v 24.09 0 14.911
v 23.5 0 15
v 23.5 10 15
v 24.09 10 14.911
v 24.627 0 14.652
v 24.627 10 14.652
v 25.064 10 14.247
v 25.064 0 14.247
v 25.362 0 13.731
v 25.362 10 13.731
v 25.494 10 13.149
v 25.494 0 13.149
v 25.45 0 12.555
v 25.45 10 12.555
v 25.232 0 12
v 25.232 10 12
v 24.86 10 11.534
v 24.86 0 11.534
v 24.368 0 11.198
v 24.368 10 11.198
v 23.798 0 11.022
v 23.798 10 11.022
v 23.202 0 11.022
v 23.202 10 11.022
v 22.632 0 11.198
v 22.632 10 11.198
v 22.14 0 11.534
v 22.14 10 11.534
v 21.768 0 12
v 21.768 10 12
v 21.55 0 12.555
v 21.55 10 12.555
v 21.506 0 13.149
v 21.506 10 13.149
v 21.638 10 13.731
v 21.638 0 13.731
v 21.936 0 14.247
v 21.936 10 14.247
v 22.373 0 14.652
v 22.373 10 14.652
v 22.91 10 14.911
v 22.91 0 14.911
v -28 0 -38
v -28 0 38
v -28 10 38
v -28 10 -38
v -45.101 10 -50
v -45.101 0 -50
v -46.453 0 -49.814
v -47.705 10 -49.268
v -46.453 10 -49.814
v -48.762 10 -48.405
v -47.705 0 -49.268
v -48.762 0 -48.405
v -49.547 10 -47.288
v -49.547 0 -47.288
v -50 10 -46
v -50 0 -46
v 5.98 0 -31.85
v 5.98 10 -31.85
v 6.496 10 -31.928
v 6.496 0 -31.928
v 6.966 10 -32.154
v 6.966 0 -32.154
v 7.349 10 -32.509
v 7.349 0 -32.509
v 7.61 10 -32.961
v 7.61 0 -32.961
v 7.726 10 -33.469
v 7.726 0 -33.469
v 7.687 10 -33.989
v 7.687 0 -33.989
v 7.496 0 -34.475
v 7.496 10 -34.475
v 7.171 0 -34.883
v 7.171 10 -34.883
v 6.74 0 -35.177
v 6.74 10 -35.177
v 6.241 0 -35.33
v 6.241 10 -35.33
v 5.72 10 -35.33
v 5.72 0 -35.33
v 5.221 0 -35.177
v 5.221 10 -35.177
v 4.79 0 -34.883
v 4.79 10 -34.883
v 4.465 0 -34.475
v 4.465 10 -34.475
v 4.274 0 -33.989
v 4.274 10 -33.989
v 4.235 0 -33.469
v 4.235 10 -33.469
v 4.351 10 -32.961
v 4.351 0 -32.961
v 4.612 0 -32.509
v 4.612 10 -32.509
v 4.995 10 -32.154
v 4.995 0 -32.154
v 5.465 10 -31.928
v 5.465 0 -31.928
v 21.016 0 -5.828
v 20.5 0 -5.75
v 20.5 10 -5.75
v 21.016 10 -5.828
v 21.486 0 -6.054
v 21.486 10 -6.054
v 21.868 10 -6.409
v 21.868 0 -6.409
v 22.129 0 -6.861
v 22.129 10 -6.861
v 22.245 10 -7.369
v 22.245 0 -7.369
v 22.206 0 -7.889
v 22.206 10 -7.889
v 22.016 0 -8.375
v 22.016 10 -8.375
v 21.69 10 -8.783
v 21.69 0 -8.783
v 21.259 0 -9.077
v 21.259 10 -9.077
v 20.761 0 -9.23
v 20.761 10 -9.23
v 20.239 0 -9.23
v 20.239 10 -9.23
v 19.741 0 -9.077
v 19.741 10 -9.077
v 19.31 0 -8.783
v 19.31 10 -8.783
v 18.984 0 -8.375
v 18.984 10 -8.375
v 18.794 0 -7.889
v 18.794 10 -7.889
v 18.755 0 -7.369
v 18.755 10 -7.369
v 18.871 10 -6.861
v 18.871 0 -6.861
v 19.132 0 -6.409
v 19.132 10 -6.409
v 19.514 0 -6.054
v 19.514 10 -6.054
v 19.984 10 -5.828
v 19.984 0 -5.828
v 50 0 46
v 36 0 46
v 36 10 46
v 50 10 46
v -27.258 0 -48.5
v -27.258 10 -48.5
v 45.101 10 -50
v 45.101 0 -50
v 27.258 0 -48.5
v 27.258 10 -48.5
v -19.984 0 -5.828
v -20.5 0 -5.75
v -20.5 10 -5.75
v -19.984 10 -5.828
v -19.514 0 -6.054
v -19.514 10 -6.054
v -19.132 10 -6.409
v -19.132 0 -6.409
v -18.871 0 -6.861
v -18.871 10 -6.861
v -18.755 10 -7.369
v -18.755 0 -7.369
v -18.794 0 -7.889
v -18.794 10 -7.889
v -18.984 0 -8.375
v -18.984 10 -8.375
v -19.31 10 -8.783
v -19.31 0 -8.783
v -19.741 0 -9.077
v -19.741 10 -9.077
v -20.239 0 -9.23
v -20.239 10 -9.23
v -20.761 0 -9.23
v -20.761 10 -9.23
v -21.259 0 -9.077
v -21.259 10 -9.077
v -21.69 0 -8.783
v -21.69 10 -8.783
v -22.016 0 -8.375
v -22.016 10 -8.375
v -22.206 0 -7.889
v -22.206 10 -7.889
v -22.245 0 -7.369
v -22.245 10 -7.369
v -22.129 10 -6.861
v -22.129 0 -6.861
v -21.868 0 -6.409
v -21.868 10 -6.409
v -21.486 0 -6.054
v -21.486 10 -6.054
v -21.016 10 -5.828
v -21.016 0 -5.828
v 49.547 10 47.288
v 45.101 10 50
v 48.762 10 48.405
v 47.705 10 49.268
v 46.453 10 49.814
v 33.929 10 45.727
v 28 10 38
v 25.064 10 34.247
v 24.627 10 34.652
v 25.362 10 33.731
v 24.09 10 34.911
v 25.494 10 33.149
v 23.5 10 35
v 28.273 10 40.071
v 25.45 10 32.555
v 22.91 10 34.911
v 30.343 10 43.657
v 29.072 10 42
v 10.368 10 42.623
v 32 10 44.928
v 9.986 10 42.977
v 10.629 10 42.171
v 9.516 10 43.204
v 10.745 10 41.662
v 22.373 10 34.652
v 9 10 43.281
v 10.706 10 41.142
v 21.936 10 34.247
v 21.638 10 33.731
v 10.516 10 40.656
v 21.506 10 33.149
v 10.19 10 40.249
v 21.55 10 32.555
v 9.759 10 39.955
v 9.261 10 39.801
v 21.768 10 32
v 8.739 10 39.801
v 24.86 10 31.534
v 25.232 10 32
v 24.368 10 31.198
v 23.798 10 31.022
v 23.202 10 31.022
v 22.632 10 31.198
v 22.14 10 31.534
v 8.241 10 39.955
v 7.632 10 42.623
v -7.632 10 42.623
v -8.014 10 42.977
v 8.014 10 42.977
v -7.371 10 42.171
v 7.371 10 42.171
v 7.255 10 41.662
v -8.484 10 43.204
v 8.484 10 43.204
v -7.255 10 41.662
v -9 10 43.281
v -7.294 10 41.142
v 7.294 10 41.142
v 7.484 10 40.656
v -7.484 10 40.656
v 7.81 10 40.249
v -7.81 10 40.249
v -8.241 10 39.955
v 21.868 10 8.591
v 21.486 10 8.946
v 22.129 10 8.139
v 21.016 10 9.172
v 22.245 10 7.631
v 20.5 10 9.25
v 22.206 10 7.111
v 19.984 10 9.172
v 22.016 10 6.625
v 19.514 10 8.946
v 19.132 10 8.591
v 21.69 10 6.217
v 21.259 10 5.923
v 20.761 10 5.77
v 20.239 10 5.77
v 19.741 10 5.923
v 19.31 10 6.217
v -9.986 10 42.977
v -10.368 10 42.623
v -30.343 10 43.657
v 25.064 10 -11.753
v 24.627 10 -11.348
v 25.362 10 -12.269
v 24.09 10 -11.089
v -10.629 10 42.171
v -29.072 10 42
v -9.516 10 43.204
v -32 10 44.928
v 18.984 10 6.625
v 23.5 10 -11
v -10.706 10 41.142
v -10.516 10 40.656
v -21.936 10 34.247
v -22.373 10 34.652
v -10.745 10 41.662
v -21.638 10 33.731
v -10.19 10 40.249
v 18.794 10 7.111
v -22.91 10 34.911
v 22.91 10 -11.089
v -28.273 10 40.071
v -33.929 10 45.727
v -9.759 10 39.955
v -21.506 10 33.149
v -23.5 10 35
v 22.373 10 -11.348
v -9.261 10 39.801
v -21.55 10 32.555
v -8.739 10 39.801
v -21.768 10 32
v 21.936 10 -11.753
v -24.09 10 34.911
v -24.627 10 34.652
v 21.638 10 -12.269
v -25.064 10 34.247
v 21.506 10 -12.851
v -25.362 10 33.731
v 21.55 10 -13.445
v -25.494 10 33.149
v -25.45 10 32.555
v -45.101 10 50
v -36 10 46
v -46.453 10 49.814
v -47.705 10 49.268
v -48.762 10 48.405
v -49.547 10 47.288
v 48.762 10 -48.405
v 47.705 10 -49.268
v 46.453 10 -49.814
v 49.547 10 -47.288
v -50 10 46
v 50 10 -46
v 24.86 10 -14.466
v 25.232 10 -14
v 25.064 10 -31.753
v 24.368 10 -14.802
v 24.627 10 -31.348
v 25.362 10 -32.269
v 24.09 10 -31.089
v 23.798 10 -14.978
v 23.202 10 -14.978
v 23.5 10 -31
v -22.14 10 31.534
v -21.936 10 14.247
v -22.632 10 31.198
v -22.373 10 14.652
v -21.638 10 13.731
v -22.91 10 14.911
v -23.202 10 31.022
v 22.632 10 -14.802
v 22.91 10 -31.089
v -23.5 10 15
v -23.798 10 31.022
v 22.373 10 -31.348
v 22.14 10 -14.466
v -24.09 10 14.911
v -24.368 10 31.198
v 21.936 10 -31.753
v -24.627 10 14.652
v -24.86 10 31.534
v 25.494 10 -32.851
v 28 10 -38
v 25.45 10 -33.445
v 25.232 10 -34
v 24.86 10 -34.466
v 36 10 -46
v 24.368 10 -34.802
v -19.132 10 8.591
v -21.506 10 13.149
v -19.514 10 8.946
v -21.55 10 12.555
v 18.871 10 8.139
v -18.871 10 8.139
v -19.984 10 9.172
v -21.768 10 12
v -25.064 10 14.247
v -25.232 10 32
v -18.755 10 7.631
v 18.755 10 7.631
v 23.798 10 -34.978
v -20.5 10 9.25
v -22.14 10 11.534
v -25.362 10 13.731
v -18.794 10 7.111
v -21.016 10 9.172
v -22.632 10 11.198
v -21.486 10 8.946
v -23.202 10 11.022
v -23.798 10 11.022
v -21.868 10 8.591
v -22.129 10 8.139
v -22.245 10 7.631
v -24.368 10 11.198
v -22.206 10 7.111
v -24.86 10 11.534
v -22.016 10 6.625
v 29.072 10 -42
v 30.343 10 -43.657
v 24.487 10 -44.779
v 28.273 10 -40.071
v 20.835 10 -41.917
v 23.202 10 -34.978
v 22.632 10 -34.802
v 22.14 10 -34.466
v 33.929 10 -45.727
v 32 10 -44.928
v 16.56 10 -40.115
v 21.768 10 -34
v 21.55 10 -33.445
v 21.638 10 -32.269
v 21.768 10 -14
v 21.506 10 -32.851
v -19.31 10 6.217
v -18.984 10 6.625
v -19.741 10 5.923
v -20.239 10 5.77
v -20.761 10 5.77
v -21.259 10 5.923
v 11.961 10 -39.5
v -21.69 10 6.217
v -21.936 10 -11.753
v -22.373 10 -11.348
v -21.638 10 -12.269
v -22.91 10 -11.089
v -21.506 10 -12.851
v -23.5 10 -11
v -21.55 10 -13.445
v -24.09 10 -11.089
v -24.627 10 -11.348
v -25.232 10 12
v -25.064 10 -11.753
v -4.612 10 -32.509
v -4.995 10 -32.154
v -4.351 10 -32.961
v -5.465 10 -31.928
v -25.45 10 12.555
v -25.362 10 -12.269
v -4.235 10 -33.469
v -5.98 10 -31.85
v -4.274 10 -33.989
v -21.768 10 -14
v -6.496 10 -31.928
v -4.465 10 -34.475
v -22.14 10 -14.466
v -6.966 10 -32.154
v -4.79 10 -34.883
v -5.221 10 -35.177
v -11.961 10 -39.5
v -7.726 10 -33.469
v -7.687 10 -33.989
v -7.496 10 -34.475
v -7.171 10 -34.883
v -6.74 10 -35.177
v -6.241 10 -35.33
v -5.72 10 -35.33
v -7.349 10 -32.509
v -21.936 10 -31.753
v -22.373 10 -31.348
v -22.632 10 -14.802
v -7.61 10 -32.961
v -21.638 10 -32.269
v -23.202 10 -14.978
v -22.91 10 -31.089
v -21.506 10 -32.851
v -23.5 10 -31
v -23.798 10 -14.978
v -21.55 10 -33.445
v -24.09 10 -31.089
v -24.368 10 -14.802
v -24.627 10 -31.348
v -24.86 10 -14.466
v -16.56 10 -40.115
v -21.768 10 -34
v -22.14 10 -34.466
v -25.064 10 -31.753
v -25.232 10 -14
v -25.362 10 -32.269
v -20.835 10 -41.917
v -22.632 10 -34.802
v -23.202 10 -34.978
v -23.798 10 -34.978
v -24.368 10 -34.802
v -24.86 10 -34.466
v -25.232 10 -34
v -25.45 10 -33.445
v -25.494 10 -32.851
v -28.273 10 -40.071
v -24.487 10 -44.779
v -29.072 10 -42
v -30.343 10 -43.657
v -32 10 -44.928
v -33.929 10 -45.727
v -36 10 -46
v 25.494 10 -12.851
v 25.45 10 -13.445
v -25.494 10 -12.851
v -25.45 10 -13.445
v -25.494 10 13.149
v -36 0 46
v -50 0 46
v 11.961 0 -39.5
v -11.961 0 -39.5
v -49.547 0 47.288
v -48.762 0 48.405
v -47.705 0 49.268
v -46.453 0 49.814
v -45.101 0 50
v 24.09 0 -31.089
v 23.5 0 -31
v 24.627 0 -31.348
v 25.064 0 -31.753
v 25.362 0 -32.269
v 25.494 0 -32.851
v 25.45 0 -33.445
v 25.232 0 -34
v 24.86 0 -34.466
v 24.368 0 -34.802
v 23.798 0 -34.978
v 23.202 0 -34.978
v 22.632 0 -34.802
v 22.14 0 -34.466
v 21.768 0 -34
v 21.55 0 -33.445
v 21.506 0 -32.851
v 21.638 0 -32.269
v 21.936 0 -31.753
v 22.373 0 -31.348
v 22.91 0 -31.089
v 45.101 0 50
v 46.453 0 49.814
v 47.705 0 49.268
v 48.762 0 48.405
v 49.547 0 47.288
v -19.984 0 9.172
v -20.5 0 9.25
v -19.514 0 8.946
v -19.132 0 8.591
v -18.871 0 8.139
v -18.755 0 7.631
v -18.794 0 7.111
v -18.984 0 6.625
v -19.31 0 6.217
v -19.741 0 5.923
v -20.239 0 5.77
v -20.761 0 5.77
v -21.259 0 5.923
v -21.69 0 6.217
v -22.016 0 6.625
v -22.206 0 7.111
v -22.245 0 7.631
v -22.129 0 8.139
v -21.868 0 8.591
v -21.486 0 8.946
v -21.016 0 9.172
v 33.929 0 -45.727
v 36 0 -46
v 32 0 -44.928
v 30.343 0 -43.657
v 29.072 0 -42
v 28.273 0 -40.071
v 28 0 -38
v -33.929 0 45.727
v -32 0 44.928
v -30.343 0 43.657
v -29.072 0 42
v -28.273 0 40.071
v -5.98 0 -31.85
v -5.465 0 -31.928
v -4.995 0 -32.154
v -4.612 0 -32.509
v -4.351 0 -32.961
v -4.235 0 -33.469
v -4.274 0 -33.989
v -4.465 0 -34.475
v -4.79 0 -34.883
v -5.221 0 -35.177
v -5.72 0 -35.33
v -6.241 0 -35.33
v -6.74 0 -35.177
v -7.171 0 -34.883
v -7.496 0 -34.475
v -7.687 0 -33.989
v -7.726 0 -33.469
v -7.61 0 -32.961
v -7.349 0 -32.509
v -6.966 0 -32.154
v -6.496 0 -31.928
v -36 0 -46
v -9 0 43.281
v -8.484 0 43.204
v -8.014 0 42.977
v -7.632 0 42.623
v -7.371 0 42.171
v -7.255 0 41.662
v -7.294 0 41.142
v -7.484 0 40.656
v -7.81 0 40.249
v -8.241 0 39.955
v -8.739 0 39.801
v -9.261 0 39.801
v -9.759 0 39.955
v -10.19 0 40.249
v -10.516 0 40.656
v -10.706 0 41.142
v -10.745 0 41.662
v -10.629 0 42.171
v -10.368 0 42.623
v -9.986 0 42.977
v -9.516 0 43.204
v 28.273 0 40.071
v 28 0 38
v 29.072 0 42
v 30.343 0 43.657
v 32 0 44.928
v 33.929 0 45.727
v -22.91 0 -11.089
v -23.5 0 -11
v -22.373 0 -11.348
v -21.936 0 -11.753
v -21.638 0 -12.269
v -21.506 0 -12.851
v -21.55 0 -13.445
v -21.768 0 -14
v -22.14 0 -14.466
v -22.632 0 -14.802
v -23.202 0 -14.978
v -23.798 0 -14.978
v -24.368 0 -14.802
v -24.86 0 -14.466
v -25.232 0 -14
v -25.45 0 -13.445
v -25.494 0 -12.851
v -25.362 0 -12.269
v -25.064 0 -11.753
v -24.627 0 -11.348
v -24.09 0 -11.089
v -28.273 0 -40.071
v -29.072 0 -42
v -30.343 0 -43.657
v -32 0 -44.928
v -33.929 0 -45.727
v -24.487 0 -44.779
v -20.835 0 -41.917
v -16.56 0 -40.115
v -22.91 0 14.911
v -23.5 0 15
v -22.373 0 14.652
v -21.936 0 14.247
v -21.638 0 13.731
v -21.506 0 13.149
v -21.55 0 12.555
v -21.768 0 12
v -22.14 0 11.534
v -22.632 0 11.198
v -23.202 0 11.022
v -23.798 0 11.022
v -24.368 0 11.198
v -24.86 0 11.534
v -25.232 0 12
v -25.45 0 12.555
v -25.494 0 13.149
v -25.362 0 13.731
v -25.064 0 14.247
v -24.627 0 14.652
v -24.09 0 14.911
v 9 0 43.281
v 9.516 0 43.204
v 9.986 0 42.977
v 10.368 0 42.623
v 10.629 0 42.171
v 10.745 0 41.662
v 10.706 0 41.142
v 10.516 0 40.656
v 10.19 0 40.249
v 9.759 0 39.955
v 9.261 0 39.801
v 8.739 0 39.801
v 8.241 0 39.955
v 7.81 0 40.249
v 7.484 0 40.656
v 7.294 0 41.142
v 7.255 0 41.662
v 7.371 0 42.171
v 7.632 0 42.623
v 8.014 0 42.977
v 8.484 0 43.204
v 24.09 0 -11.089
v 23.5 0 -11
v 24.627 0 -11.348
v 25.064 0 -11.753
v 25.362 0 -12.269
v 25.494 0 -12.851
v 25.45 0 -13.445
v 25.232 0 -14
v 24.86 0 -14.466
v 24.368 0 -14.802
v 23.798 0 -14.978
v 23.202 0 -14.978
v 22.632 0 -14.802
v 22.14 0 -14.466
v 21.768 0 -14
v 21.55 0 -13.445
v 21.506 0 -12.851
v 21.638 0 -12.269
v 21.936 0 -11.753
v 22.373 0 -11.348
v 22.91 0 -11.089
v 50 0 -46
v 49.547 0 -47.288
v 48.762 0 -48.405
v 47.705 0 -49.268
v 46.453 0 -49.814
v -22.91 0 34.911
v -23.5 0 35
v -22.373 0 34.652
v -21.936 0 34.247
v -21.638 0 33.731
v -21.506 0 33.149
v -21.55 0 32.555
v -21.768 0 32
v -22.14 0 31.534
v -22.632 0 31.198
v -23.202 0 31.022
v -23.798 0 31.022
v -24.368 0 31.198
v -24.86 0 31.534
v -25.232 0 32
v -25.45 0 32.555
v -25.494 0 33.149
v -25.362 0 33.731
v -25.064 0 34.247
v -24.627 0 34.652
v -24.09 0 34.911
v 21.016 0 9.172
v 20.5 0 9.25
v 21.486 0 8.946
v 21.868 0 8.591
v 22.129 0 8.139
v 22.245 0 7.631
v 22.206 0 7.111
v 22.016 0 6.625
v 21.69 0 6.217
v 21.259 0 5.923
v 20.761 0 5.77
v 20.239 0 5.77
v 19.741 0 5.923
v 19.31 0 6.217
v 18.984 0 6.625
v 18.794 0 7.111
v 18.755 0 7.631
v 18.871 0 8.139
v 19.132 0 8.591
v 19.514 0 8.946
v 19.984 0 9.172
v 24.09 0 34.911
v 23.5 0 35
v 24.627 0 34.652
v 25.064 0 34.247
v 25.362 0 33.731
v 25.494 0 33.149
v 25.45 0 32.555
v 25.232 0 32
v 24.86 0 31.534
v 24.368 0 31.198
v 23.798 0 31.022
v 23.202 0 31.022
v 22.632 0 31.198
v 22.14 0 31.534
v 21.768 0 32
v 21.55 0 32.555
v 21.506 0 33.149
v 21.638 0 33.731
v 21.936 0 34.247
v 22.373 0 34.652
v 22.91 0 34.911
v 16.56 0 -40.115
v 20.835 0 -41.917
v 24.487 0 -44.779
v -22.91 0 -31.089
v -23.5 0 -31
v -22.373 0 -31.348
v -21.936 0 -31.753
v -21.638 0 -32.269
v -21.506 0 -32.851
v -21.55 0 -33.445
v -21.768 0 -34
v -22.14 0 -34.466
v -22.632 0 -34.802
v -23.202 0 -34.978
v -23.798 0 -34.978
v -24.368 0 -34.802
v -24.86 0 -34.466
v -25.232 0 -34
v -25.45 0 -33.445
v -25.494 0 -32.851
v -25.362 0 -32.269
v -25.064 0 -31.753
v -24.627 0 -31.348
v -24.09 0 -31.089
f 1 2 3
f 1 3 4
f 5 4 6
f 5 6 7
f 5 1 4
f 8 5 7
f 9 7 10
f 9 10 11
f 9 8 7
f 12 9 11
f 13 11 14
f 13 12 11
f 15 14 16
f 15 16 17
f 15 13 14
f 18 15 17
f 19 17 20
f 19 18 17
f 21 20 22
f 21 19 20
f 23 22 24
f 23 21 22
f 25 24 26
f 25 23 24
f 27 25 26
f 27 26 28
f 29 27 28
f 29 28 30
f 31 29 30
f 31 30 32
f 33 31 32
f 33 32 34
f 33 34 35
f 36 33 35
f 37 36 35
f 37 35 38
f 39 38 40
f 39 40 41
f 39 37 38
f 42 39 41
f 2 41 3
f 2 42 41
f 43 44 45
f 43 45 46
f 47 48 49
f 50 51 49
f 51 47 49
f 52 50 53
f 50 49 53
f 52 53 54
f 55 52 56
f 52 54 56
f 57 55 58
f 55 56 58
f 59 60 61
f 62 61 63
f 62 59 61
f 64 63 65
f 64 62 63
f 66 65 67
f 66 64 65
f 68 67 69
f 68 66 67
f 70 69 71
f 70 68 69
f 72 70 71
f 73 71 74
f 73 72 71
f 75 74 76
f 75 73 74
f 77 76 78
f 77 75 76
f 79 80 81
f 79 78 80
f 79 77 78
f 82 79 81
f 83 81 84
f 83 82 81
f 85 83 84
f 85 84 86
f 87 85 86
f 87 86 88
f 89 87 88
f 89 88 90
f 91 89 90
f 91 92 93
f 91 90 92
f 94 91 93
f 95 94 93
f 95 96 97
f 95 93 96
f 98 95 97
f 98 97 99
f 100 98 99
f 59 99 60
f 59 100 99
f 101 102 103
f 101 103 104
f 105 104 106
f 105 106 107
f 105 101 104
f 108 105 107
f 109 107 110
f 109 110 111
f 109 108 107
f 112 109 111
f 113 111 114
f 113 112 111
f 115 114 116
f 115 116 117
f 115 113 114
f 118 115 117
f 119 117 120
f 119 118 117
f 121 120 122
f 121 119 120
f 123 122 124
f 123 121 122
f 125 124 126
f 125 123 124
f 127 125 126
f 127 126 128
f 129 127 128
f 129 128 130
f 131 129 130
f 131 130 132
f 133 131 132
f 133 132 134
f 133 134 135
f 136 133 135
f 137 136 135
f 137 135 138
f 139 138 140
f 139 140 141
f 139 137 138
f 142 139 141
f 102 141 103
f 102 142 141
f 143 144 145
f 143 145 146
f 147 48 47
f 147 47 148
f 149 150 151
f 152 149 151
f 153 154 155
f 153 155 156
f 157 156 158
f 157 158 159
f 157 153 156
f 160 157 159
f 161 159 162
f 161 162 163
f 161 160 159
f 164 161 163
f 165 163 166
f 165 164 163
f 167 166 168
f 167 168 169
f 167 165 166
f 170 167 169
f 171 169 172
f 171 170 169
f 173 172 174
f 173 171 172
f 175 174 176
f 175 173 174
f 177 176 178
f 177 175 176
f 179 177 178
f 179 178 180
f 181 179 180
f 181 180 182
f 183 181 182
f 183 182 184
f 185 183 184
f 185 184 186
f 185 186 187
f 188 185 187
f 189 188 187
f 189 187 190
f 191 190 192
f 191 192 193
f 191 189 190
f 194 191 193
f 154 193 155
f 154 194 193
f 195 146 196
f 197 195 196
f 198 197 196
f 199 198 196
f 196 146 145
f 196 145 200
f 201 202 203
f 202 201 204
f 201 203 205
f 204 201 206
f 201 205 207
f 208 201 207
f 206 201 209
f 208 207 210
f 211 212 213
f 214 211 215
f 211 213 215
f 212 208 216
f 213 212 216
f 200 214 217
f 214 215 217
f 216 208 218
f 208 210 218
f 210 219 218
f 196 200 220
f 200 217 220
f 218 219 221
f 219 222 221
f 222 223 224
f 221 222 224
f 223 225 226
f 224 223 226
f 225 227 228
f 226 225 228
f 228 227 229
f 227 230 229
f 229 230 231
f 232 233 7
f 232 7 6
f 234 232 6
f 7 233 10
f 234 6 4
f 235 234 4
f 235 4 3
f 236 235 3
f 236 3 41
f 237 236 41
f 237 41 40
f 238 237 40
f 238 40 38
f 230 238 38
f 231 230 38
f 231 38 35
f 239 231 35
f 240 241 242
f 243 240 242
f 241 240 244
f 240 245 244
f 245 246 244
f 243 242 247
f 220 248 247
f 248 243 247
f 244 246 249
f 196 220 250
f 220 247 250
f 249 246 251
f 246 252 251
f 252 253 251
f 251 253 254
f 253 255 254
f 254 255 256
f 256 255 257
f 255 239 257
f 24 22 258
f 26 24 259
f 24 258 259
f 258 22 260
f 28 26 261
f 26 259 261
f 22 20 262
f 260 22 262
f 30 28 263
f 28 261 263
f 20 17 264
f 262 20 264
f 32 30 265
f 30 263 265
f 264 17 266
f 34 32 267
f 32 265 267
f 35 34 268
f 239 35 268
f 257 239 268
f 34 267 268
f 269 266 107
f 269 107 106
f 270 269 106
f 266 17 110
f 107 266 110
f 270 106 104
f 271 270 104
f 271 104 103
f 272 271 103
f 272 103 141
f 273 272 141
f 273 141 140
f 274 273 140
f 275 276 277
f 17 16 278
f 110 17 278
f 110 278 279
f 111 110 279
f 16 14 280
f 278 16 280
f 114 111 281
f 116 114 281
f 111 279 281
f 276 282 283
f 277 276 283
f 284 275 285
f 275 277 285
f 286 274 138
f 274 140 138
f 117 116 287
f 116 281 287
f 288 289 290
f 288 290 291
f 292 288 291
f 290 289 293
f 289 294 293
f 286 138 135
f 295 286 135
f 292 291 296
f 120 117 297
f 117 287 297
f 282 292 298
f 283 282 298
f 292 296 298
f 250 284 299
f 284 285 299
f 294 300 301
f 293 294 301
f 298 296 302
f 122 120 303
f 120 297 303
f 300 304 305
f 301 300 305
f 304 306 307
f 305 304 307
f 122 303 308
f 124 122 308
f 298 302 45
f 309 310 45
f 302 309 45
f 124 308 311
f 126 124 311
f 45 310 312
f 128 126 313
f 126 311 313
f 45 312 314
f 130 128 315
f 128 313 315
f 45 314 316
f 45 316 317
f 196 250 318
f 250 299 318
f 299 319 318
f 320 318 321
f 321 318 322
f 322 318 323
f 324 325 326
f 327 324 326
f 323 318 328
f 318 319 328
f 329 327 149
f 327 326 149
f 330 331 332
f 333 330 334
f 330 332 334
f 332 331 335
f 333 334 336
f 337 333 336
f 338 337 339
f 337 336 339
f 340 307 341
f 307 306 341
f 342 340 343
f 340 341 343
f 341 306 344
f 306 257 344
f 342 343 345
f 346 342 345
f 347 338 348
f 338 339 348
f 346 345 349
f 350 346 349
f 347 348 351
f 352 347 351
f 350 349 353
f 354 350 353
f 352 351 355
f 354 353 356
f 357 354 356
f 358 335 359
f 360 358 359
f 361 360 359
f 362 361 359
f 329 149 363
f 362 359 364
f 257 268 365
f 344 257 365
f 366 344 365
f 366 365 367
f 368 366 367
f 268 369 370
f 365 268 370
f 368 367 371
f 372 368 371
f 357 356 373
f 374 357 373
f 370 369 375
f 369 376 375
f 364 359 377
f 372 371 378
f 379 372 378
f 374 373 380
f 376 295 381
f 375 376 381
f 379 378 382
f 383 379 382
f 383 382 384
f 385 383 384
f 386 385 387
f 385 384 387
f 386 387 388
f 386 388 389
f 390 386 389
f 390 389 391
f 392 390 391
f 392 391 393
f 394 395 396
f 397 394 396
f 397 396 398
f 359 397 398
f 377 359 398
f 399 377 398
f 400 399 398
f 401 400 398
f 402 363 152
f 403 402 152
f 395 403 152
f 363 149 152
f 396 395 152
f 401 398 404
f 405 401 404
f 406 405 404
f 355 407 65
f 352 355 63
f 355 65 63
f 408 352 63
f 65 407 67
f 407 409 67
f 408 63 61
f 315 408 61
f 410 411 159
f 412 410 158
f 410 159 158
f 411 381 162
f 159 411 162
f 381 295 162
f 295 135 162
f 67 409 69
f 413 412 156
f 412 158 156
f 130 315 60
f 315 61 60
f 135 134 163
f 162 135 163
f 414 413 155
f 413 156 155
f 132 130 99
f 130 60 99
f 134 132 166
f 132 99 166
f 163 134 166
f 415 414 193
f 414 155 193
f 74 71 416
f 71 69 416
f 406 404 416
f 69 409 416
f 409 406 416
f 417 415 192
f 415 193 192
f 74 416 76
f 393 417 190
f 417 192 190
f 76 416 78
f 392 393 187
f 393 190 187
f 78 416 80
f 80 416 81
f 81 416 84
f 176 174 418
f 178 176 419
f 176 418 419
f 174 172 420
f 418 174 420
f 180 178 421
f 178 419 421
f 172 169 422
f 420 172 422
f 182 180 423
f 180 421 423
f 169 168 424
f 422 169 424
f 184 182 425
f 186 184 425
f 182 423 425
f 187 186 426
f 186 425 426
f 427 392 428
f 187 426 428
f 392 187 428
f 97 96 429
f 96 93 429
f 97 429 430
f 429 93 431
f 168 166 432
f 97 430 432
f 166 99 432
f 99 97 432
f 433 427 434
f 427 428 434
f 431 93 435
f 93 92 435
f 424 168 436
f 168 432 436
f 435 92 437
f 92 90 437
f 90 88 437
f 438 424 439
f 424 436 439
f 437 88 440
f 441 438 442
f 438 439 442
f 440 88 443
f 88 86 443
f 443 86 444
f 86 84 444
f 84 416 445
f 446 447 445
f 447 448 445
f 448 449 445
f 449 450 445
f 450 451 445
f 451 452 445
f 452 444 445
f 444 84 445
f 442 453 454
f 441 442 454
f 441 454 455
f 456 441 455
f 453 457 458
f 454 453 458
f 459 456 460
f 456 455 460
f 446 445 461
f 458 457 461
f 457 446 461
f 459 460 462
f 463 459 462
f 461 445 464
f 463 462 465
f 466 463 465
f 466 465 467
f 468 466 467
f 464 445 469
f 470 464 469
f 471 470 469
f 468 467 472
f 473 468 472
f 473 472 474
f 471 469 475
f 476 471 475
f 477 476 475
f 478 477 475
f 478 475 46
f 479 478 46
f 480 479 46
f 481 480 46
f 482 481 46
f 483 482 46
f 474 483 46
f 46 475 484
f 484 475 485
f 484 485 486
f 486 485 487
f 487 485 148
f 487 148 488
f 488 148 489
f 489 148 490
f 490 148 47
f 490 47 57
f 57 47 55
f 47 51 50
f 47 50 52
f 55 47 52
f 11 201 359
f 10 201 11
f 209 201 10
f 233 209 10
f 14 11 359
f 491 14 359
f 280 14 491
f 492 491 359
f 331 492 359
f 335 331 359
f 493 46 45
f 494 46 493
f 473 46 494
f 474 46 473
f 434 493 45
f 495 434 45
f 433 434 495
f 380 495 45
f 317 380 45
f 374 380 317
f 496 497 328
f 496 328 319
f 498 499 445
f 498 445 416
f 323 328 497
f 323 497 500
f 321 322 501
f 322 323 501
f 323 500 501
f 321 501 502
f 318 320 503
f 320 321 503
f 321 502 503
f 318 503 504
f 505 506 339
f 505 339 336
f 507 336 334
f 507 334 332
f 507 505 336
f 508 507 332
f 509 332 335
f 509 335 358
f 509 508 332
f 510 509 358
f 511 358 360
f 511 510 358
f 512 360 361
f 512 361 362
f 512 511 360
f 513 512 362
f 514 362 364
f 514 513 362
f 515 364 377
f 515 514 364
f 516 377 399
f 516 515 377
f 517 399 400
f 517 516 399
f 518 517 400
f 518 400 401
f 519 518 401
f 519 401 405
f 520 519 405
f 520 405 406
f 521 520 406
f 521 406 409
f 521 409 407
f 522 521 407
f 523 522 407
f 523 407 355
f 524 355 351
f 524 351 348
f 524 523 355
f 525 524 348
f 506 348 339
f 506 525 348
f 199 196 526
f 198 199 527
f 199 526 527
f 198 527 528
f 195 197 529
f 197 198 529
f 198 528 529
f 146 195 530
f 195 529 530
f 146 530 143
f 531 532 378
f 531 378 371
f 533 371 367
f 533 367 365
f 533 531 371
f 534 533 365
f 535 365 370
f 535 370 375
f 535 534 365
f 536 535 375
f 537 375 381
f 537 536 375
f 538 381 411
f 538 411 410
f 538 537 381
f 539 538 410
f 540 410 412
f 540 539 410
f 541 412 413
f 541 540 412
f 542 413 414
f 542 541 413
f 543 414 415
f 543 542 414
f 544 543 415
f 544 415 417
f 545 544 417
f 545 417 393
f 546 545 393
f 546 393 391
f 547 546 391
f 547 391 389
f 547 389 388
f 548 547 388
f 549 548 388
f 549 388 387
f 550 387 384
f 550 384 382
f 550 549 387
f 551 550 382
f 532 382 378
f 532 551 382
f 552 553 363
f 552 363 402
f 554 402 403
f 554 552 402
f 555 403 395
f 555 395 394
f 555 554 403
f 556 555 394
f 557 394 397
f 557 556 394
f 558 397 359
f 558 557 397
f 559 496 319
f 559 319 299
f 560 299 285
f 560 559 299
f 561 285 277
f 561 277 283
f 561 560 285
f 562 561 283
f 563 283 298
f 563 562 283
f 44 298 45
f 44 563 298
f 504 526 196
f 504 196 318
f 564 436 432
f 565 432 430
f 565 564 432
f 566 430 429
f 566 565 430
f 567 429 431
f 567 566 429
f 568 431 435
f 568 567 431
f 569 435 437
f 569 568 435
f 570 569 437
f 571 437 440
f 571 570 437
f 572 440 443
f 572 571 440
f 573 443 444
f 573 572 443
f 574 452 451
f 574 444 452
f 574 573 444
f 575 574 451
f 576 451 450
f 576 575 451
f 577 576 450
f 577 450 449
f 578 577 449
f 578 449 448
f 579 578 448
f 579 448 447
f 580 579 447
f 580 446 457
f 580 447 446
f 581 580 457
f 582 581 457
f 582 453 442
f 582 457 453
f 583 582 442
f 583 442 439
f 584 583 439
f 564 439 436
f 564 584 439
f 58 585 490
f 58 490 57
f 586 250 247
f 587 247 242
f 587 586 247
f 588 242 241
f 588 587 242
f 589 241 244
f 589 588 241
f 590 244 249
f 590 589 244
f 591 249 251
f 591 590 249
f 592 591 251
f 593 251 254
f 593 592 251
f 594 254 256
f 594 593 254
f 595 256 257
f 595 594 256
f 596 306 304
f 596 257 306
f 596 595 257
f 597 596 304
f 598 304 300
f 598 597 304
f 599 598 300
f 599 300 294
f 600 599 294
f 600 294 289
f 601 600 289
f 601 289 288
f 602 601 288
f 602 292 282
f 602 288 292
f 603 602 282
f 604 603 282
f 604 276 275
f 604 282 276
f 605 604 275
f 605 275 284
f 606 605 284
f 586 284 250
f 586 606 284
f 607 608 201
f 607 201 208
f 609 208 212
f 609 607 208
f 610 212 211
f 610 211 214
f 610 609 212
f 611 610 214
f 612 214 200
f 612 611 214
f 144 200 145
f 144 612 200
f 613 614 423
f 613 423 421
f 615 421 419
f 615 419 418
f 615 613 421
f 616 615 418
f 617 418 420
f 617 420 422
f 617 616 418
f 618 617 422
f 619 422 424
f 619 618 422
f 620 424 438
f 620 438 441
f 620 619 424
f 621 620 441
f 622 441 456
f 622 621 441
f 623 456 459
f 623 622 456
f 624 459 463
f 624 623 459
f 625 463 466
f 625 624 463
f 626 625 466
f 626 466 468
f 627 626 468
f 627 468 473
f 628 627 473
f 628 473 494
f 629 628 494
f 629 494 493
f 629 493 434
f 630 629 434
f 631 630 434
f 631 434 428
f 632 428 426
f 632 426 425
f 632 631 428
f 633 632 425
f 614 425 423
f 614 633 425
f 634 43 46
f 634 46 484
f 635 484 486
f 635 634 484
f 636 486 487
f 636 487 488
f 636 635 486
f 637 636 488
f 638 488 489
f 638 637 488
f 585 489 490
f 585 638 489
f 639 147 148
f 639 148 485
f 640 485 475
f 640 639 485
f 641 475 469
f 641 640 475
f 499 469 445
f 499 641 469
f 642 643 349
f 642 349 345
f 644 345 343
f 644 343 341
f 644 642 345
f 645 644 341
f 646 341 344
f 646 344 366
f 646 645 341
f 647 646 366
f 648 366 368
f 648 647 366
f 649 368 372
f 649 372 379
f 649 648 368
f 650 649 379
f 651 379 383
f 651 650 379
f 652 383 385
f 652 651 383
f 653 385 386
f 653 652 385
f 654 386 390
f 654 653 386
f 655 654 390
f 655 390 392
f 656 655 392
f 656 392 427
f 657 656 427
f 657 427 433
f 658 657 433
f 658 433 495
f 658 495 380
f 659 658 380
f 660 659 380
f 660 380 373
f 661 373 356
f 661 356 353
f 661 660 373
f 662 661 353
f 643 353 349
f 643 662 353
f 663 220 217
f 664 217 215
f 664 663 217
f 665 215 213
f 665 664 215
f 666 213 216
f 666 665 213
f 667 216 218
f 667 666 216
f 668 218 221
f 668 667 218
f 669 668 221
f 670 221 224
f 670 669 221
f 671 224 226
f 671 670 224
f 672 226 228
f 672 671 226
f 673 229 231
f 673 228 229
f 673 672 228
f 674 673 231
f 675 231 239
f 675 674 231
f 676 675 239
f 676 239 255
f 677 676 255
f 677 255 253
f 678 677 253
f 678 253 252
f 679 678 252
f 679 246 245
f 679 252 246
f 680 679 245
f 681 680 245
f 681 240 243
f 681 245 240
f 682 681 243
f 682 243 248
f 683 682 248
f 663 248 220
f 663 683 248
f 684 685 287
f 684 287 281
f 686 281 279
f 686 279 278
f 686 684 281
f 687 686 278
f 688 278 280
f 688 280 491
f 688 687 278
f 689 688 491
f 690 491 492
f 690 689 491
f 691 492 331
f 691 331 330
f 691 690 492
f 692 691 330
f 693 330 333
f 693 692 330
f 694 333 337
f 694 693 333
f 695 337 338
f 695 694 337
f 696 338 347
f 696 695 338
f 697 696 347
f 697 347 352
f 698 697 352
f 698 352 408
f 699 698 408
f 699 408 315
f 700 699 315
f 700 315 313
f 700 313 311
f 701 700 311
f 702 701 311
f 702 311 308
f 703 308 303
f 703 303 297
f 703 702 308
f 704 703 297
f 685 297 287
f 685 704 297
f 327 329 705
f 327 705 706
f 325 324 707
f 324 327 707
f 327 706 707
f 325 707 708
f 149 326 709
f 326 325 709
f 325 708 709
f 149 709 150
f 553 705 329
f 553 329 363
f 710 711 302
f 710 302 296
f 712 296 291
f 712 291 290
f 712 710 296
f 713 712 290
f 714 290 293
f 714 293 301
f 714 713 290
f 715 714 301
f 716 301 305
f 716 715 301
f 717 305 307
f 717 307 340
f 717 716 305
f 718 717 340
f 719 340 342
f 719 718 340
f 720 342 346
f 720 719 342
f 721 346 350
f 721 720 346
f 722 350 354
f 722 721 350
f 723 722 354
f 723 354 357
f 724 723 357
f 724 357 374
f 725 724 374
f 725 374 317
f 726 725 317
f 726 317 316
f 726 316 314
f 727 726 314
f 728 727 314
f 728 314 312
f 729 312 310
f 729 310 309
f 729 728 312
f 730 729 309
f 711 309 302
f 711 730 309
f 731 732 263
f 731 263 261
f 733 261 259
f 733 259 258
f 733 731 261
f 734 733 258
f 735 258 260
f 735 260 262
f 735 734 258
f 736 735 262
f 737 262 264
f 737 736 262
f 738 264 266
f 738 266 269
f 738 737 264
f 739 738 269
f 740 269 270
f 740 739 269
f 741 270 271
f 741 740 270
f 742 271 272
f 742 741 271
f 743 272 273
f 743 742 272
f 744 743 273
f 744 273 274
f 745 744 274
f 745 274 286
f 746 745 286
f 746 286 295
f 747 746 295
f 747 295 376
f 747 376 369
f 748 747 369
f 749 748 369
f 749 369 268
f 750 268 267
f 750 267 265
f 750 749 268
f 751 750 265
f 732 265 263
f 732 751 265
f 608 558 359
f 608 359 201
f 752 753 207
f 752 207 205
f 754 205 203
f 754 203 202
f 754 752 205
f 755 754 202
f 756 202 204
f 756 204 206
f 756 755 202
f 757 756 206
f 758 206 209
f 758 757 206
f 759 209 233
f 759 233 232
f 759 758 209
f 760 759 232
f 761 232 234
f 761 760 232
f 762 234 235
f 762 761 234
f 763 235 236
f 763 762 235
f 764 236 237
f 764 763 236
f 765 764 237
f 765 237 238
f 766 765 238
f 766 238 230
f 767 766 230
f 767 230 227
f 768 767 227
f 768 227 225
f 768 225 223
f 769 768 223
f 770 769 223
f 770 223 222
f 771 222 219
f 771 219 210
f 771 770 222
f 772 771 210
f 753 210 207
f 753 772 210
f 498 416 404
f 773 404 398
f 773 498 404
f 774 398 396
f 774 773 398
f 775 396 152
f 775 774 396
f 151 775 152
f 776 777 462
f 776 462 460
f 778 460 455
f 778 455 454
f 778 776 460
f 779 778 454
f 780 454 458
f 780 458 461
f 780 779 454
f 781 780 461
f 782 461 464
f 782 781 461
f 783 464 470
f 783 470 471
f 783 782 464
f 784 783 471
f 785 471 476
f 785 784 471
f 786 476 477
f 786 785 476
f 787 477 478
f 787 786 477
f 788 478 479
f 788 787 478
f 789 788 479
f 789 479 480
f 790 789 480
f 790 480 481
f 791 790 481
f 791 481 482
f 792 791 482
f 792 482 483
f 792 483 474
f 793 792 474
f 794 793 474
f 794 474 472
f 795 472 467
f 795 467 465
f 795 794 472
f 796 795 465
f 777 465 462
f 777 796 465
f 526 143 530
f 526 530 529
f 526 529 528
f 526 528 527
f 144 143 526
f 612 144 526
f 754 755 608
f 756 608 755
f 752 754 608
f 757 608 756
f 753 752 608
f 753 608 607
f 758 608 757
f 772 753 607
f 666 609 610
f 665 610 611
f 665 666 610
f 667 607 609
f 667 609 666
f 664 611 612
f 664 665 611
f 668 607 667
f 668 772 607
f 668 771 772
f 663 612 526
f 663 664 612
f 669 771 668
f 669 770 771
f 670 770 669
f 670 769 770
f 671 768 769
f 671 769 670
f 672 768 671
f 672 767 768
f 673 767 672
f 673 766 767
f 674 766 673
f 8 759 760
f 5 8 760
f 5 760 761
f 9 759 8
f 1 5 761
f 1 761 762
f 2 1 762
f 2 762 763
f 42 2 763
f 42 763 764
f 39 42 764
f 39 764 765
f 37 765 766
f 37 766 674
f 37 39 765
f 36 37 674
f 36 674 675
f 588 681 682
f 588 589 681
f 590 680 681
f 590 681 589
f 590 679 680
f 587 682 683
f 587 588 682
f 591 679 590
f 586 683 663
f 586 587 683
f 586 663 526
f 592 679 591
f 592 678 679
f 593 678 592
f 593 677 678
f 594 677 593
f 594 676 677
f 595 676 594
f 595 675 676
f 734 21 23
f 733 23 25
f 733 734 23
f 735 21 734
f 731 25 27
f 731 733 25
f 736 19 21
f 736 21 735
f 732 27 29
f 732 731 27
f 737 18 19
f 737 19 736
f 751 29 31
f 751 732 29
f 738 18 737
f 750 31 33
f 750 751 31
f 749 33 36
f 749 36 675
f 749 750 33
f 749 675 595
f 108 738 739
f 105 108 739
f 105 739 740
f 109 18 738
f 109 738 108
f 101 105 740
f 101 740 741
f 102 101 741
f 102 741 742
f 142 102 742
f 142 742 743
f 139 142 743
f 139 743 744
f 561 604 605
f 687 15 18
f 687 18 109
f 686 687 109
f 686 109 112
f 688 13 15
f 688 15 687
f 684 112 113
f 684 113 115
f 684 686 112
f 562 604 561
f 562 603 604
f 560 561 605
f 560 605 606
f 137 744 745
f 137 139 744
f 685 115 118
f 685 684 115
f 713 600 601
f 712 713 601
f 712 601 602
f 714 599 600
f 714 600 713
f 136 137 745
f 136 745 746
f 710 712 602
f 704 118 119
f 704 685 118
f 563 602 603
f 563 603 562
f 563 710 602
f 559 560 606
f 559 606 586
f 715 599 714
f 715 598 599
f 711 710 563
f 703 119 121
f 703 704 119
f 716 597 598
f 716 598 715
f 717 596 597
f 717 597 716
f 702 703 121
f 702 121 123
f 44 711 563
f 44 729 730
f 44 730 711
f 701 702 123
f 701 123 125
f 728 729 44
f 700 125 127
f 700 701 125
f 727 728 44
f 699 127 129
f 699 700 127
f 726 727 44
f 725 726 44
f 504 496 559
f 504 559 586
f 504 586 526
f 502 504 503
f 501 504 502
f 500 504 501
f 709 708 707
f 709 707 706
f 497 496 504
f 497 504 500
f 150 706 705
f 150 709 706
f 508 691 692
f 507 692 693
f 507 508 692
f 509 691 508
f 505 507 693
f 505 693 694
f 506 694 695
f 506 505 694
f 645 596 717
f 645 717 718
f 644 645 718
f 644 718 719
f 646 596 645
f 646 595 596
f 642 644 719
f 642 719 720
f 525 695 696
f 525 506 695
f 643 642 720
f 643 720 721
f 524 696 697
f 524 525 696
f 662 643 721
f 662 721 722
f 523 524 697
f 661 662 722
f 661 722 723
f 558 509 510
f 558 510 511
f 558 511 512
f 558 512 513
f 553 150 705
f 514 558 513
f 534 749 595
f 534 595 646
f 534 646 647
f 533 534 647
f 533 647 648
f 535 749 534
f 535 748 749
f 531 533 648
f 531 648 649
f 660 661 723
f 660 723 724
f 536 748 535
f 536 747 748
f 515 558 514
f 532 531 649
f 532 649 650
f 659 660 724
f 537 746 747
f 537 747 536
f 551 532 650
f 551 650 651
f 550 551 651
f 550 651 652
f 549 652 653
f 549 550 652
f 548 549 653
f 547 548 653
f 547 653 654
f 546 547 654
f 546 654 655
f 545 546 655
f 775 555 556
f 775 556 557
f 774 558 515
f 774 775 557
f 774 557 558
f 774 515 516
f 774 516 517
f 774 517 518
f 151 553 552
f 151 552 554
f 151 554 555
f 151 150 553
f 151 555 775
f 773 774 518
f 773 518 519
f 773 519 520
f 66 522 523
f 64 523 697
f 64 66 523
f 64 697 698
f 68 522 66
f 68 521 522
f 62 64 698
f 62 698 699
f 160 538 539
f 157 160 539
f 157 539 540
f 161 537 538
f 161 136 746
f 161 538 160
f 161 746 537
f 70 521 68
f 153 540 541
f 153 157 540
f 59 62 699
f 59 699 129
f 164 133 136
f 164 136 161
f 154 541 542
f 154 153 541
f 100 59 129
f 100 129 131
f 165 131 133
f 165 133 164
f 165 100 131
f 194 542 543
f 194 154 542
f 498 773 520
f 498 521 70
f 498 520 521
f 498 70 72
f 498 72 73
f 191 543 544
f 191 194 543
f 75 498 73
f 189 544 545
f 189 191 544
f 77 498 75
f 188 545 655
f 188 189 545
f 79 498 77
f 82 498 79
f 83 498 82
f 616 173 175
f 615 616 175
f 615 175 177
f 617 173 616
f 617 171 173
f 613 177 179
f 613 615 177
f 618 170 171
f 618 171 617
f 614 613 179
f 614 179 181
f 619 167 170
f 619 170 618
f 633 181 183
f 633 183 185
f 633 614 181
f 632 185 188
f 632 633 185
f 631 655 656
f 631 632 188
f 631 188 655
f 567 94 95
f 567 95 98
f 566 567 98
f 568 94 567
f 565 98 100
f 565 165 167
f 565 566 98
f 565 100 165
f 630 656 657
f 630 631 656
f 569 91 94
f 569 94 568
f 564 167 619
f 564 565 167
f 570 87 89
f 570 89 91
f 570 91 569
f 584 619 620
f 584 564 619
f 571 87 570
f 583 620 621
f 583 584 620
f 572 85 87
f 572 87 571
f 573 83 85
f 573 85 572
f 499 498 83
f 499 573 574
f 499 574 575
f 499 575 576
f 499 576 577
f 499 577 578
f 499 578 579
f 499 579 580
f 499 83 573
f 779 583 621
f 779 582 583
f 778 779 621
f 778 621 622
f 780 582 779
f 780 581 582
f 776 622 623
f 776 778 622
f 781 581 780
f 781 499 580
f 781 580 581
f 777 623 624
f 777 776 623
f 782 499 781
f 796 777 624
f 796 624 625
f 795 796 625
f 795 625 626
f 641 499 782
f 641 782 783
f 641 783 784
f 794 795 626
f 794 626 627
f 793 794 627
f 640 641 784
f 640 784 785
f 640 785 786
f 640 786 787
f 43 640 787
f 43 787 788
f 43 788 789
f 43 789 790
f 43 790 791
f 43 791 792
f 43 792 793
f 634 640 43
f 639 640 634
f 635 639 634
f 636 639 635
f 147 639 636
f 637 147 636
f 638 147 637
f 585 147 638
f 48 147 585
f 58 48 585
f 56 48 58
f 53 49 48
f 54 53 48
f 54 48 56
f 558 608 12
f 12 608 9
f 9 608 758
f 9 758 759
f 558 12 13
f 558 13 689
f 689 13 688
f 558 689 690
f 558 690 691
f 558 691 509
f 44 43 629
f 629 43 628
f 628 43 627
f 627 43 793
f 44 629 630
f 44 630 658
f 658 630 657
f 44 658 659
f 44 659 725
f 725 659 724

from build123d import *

# Parameters (mm, degrees)
SKETCH2_R               = 2
SKETCH2_R_2             = 1.75
BOSS_EXTRUDE1_DEPTH     = 10
FILLET1_R               = 5
CUT_EXTRUDE1_START      = -15
CUT_EXTRUDE1_DEPTH      = 15
CUT_EXTRUDE2_DEPTH      = 72.414284285
CUT_EXTRUDE2_DEPTH_BACK = 10
SKETCH5_R               = 1.75


with BuildPart() as part:
    # Sketch2 → Boss-Extrude1 (new body)
    with BuildSketch(Plane(origin=(0, 0, 0), x_dir=(1, 0, 0), z_dir=(0, 1, 0))):
        with BuildLine():
            Line((-50, 50), (-28, 50))
            ThreePointArc((-28, 50), (-21.546129824, 42.358449536), (-11.960985068, 39.5))
            Line((-11.960985068, 39.5), (11.960985068, 39.5))
            ThreePointArc((11.960985068, 39.5), (21.546129824, 42.358449536), (28, 50))
            Line((28, 50), (50, 50))
            Line((50, 50), (50, 46))
            Line((50, 46), (36, 46))
            ThreePointArc((36, 46), (30.343145751, 43.656854249), (28, 38))
            Line((28, 38), (28, -38))
            ThreePointArc((28, -38), (30.343145751, -43.656854249), (36, -46))
            Line((36, -46), (50, -46))
            Line((50, -46), (50, -50))
            Line((50, -50), (-50, -50))
            Line((-50, -50), (-50, -46))
            Line((-50, -46), (-36, -46))
            ThreePointArc((-36, -46), (-30.343145751, -43.656854249), (-28, -38))
            Line((-28, -38), (-28, 38))
            ThreePointArc((-28, 38), (-30.343145751, 43.656854249), (-36, 46))
            Line((-36, 46), (-50, 46))
            Line((-50, 46), (-50, 50))
        make_face()
        with Locations(Location((-23.5, 33, 0), (0, 0, 270))):
            Circle(SKETCH2_R, mode=Mode.SUBTRACT)
        with Locations(Location((-23.5, 13, 0), (0, 0, 270))):
            Circle(SKETCH2_R, mode=Mode.SUBTRACT)
        with Locations(Location((23.5, 33, 0), (0, 0, 270))):
            Circle(SKETCH2_R, mode=Mode.SUBTRACT)
        with Locations(Location((23.5, 13, 0), (0, 0, 270))):
            Circle(SKETCH2_R, mode=Mode.SUBTRACT)
        with Locations(Location((-23.5, -33, 0), (0, 0, 270))):
            Circle(SKETCH2_R, mode=Mode.SUBTRACT)
        with Locations(Location((23.5, -33, 0), (0, 0, 270))):
            Circle(SKETCH2_R, mode=Mode.SUBTRACT)
        with Locations(Location((23.5, -13, 0), (0, 0, 270))):
            Circle(SKETCH2_R, mode=Mode.SUBTRACT)
        with Locations(Location((-23.5, -13, 0), (0, 0, 270))):
            Circle(SKETCH2_R, mode=Mode.SUBTRACT)
        with Locations(Location((-20.5, 7.5, 0), (0, 0, 270))):
            Circle(SKETCH2_R_2, mode=Mode.SUBTRACT)
        with Locations(Location((20.5, 7.5, 0), (0, 0, 270))):
            Circle(SKETCH2_R_2, mode=Mode.SUBTRACT)
        with Locations(Location((20.5, -7.5, 0), (0, 0, 270))):
            Circle(SKETCH2_R_2, mode=Mode.SUBTRACT)
        with Locations(Location((-20.5, -7.5, 0), (0, 0, 270))):
            Circle(SKETCH2_R_2, mode=Mode.SUBTRACT)
    extrude(amount=BOSS_EXTRUDE1_DEPTH)

    # Fillet1
    # the kernel refuses this fillet: 5 mm, written as the material it takes off along each edge
    with BuildSketch(Plane(origin=(50, -12.247448714, 50), x_dir=(-1.5667467323505199e-12, 0, -1.0), z_dir=(0, 1, 0)), Plane(origin=(-50, -12.247448714, -50), x_dir=(1.5685230891899197e-12, 0, 1.0), z_dir=(0, 1, 0))) as fillet1_piece_1:
        with BuildLine():
            CenterArc((5, 4.898979486), FILLET1_R, 180, 78.463040967)
            Line((0, 4.898979486), (-0.1, 4.898979486))
            Line((-0.1, 4.898979486), (-0.1, 0))
            Line((-0.1, 0), (0, -0.1))
            ThreePointArc((0, -0.1), (2, -0.1), (3.98, -0.09797959))
            Line((3.98, -0.09797959), (4, 0))
        make_face()
    extrude(amount=34.494897428, mode=Mode.SUBTRACT)
    with BuildSketch(Plane(origin=(-50, -12.247448714, 50), x_dir=(1, 0, 0), z_dir=(0, 1, 0)), Plane(origin=(50, -12.247448714, -50), x_dir=(-1, 0, 0), z_dir=(0, 1, 0))) as fillet1_piece_2:
        with BuildLine():
            CenterArc((4.898979486, 5), FILLET1_R, 191.536959033, 78.463040967)
            Line((0, 4), (-0.09797959, 3.98))
            ThreePointArc((-0.09797959, 3.98), (-0.1, 2), (-0.1, 0))
            Line((-0.1, 0), (0, -0.1))
            Line((0, -0.1), (4.898979486, -0.1))
            Line((4.898979486, -0.1), (4.898979486, 0))
        make_face()
    extrude(amount=34.494897428, mode=Mode.SUBTRACT)

    # Sketch4 → Cut-Extrude1 (cut)
    with BuildSketch(Plane(origin=(0, 10, 0), x_dir=(1, 0, 0), z_dir=(0, 1, 0)).offset(CUT_EXTRUDE1_START)):
        with BuildLine():
            Line((45.101020514, 50), (27.258043608, 48.5))
            ThreePointArc((27.258043608, 48.5), (27.646962091, 49.24112606), (28, 50))
            Line((28, 50), (45.101020514, 50))
        make_face()
        with BuildLine():
            Line((-45.101020514, 50), (-27.258043608, 48.5))
            ThreePointArc((-27.258043608, 48.5), (-27.646962091, 49.24112606), (-28, 50))
            Line((-28, 50), (-45.101020514, 50))
        make_face()
    extrude(amount=CUT_EXTRUDE1_DEPTH, mode=Mode.SUBTRACT)

    # Sketch5 → Cut-Extrude2 (cut, two sides: drawn at the far end of the back side and taken through both)
    with BuildSketch(Plane(origin=(0, 10, 0), x_dir=(1, 0, 0), z_dir=(0, 1, 0)).offset(-CUT_EXTRUDE2_DEPTH_BACK)):
        with Locations(Location((9, -41.531499153, 0), (0, 0, 270))):
            Circle(SKETCH5_R)
        with Locations(Location((-9, -41.531499153, 0), (0, 0, 270))):
            Circle(SKETCH5_R)
        with Locations(Location((5.980492534, 33.6, 0), (0, 0, 270))):
            Circle(SKETCH5_R)
        with Locations(Location((-5.980492534, 33.6, 0), (0, 0, 270))):
            Circle(SKETCH5_R)
    extrude(amount=CUT_EXTRUDE2_DEPTH + CUT_EXTRUDE2_DEPTH_BACK, mode=Mode.SUBTRACT)


solid = part.part
